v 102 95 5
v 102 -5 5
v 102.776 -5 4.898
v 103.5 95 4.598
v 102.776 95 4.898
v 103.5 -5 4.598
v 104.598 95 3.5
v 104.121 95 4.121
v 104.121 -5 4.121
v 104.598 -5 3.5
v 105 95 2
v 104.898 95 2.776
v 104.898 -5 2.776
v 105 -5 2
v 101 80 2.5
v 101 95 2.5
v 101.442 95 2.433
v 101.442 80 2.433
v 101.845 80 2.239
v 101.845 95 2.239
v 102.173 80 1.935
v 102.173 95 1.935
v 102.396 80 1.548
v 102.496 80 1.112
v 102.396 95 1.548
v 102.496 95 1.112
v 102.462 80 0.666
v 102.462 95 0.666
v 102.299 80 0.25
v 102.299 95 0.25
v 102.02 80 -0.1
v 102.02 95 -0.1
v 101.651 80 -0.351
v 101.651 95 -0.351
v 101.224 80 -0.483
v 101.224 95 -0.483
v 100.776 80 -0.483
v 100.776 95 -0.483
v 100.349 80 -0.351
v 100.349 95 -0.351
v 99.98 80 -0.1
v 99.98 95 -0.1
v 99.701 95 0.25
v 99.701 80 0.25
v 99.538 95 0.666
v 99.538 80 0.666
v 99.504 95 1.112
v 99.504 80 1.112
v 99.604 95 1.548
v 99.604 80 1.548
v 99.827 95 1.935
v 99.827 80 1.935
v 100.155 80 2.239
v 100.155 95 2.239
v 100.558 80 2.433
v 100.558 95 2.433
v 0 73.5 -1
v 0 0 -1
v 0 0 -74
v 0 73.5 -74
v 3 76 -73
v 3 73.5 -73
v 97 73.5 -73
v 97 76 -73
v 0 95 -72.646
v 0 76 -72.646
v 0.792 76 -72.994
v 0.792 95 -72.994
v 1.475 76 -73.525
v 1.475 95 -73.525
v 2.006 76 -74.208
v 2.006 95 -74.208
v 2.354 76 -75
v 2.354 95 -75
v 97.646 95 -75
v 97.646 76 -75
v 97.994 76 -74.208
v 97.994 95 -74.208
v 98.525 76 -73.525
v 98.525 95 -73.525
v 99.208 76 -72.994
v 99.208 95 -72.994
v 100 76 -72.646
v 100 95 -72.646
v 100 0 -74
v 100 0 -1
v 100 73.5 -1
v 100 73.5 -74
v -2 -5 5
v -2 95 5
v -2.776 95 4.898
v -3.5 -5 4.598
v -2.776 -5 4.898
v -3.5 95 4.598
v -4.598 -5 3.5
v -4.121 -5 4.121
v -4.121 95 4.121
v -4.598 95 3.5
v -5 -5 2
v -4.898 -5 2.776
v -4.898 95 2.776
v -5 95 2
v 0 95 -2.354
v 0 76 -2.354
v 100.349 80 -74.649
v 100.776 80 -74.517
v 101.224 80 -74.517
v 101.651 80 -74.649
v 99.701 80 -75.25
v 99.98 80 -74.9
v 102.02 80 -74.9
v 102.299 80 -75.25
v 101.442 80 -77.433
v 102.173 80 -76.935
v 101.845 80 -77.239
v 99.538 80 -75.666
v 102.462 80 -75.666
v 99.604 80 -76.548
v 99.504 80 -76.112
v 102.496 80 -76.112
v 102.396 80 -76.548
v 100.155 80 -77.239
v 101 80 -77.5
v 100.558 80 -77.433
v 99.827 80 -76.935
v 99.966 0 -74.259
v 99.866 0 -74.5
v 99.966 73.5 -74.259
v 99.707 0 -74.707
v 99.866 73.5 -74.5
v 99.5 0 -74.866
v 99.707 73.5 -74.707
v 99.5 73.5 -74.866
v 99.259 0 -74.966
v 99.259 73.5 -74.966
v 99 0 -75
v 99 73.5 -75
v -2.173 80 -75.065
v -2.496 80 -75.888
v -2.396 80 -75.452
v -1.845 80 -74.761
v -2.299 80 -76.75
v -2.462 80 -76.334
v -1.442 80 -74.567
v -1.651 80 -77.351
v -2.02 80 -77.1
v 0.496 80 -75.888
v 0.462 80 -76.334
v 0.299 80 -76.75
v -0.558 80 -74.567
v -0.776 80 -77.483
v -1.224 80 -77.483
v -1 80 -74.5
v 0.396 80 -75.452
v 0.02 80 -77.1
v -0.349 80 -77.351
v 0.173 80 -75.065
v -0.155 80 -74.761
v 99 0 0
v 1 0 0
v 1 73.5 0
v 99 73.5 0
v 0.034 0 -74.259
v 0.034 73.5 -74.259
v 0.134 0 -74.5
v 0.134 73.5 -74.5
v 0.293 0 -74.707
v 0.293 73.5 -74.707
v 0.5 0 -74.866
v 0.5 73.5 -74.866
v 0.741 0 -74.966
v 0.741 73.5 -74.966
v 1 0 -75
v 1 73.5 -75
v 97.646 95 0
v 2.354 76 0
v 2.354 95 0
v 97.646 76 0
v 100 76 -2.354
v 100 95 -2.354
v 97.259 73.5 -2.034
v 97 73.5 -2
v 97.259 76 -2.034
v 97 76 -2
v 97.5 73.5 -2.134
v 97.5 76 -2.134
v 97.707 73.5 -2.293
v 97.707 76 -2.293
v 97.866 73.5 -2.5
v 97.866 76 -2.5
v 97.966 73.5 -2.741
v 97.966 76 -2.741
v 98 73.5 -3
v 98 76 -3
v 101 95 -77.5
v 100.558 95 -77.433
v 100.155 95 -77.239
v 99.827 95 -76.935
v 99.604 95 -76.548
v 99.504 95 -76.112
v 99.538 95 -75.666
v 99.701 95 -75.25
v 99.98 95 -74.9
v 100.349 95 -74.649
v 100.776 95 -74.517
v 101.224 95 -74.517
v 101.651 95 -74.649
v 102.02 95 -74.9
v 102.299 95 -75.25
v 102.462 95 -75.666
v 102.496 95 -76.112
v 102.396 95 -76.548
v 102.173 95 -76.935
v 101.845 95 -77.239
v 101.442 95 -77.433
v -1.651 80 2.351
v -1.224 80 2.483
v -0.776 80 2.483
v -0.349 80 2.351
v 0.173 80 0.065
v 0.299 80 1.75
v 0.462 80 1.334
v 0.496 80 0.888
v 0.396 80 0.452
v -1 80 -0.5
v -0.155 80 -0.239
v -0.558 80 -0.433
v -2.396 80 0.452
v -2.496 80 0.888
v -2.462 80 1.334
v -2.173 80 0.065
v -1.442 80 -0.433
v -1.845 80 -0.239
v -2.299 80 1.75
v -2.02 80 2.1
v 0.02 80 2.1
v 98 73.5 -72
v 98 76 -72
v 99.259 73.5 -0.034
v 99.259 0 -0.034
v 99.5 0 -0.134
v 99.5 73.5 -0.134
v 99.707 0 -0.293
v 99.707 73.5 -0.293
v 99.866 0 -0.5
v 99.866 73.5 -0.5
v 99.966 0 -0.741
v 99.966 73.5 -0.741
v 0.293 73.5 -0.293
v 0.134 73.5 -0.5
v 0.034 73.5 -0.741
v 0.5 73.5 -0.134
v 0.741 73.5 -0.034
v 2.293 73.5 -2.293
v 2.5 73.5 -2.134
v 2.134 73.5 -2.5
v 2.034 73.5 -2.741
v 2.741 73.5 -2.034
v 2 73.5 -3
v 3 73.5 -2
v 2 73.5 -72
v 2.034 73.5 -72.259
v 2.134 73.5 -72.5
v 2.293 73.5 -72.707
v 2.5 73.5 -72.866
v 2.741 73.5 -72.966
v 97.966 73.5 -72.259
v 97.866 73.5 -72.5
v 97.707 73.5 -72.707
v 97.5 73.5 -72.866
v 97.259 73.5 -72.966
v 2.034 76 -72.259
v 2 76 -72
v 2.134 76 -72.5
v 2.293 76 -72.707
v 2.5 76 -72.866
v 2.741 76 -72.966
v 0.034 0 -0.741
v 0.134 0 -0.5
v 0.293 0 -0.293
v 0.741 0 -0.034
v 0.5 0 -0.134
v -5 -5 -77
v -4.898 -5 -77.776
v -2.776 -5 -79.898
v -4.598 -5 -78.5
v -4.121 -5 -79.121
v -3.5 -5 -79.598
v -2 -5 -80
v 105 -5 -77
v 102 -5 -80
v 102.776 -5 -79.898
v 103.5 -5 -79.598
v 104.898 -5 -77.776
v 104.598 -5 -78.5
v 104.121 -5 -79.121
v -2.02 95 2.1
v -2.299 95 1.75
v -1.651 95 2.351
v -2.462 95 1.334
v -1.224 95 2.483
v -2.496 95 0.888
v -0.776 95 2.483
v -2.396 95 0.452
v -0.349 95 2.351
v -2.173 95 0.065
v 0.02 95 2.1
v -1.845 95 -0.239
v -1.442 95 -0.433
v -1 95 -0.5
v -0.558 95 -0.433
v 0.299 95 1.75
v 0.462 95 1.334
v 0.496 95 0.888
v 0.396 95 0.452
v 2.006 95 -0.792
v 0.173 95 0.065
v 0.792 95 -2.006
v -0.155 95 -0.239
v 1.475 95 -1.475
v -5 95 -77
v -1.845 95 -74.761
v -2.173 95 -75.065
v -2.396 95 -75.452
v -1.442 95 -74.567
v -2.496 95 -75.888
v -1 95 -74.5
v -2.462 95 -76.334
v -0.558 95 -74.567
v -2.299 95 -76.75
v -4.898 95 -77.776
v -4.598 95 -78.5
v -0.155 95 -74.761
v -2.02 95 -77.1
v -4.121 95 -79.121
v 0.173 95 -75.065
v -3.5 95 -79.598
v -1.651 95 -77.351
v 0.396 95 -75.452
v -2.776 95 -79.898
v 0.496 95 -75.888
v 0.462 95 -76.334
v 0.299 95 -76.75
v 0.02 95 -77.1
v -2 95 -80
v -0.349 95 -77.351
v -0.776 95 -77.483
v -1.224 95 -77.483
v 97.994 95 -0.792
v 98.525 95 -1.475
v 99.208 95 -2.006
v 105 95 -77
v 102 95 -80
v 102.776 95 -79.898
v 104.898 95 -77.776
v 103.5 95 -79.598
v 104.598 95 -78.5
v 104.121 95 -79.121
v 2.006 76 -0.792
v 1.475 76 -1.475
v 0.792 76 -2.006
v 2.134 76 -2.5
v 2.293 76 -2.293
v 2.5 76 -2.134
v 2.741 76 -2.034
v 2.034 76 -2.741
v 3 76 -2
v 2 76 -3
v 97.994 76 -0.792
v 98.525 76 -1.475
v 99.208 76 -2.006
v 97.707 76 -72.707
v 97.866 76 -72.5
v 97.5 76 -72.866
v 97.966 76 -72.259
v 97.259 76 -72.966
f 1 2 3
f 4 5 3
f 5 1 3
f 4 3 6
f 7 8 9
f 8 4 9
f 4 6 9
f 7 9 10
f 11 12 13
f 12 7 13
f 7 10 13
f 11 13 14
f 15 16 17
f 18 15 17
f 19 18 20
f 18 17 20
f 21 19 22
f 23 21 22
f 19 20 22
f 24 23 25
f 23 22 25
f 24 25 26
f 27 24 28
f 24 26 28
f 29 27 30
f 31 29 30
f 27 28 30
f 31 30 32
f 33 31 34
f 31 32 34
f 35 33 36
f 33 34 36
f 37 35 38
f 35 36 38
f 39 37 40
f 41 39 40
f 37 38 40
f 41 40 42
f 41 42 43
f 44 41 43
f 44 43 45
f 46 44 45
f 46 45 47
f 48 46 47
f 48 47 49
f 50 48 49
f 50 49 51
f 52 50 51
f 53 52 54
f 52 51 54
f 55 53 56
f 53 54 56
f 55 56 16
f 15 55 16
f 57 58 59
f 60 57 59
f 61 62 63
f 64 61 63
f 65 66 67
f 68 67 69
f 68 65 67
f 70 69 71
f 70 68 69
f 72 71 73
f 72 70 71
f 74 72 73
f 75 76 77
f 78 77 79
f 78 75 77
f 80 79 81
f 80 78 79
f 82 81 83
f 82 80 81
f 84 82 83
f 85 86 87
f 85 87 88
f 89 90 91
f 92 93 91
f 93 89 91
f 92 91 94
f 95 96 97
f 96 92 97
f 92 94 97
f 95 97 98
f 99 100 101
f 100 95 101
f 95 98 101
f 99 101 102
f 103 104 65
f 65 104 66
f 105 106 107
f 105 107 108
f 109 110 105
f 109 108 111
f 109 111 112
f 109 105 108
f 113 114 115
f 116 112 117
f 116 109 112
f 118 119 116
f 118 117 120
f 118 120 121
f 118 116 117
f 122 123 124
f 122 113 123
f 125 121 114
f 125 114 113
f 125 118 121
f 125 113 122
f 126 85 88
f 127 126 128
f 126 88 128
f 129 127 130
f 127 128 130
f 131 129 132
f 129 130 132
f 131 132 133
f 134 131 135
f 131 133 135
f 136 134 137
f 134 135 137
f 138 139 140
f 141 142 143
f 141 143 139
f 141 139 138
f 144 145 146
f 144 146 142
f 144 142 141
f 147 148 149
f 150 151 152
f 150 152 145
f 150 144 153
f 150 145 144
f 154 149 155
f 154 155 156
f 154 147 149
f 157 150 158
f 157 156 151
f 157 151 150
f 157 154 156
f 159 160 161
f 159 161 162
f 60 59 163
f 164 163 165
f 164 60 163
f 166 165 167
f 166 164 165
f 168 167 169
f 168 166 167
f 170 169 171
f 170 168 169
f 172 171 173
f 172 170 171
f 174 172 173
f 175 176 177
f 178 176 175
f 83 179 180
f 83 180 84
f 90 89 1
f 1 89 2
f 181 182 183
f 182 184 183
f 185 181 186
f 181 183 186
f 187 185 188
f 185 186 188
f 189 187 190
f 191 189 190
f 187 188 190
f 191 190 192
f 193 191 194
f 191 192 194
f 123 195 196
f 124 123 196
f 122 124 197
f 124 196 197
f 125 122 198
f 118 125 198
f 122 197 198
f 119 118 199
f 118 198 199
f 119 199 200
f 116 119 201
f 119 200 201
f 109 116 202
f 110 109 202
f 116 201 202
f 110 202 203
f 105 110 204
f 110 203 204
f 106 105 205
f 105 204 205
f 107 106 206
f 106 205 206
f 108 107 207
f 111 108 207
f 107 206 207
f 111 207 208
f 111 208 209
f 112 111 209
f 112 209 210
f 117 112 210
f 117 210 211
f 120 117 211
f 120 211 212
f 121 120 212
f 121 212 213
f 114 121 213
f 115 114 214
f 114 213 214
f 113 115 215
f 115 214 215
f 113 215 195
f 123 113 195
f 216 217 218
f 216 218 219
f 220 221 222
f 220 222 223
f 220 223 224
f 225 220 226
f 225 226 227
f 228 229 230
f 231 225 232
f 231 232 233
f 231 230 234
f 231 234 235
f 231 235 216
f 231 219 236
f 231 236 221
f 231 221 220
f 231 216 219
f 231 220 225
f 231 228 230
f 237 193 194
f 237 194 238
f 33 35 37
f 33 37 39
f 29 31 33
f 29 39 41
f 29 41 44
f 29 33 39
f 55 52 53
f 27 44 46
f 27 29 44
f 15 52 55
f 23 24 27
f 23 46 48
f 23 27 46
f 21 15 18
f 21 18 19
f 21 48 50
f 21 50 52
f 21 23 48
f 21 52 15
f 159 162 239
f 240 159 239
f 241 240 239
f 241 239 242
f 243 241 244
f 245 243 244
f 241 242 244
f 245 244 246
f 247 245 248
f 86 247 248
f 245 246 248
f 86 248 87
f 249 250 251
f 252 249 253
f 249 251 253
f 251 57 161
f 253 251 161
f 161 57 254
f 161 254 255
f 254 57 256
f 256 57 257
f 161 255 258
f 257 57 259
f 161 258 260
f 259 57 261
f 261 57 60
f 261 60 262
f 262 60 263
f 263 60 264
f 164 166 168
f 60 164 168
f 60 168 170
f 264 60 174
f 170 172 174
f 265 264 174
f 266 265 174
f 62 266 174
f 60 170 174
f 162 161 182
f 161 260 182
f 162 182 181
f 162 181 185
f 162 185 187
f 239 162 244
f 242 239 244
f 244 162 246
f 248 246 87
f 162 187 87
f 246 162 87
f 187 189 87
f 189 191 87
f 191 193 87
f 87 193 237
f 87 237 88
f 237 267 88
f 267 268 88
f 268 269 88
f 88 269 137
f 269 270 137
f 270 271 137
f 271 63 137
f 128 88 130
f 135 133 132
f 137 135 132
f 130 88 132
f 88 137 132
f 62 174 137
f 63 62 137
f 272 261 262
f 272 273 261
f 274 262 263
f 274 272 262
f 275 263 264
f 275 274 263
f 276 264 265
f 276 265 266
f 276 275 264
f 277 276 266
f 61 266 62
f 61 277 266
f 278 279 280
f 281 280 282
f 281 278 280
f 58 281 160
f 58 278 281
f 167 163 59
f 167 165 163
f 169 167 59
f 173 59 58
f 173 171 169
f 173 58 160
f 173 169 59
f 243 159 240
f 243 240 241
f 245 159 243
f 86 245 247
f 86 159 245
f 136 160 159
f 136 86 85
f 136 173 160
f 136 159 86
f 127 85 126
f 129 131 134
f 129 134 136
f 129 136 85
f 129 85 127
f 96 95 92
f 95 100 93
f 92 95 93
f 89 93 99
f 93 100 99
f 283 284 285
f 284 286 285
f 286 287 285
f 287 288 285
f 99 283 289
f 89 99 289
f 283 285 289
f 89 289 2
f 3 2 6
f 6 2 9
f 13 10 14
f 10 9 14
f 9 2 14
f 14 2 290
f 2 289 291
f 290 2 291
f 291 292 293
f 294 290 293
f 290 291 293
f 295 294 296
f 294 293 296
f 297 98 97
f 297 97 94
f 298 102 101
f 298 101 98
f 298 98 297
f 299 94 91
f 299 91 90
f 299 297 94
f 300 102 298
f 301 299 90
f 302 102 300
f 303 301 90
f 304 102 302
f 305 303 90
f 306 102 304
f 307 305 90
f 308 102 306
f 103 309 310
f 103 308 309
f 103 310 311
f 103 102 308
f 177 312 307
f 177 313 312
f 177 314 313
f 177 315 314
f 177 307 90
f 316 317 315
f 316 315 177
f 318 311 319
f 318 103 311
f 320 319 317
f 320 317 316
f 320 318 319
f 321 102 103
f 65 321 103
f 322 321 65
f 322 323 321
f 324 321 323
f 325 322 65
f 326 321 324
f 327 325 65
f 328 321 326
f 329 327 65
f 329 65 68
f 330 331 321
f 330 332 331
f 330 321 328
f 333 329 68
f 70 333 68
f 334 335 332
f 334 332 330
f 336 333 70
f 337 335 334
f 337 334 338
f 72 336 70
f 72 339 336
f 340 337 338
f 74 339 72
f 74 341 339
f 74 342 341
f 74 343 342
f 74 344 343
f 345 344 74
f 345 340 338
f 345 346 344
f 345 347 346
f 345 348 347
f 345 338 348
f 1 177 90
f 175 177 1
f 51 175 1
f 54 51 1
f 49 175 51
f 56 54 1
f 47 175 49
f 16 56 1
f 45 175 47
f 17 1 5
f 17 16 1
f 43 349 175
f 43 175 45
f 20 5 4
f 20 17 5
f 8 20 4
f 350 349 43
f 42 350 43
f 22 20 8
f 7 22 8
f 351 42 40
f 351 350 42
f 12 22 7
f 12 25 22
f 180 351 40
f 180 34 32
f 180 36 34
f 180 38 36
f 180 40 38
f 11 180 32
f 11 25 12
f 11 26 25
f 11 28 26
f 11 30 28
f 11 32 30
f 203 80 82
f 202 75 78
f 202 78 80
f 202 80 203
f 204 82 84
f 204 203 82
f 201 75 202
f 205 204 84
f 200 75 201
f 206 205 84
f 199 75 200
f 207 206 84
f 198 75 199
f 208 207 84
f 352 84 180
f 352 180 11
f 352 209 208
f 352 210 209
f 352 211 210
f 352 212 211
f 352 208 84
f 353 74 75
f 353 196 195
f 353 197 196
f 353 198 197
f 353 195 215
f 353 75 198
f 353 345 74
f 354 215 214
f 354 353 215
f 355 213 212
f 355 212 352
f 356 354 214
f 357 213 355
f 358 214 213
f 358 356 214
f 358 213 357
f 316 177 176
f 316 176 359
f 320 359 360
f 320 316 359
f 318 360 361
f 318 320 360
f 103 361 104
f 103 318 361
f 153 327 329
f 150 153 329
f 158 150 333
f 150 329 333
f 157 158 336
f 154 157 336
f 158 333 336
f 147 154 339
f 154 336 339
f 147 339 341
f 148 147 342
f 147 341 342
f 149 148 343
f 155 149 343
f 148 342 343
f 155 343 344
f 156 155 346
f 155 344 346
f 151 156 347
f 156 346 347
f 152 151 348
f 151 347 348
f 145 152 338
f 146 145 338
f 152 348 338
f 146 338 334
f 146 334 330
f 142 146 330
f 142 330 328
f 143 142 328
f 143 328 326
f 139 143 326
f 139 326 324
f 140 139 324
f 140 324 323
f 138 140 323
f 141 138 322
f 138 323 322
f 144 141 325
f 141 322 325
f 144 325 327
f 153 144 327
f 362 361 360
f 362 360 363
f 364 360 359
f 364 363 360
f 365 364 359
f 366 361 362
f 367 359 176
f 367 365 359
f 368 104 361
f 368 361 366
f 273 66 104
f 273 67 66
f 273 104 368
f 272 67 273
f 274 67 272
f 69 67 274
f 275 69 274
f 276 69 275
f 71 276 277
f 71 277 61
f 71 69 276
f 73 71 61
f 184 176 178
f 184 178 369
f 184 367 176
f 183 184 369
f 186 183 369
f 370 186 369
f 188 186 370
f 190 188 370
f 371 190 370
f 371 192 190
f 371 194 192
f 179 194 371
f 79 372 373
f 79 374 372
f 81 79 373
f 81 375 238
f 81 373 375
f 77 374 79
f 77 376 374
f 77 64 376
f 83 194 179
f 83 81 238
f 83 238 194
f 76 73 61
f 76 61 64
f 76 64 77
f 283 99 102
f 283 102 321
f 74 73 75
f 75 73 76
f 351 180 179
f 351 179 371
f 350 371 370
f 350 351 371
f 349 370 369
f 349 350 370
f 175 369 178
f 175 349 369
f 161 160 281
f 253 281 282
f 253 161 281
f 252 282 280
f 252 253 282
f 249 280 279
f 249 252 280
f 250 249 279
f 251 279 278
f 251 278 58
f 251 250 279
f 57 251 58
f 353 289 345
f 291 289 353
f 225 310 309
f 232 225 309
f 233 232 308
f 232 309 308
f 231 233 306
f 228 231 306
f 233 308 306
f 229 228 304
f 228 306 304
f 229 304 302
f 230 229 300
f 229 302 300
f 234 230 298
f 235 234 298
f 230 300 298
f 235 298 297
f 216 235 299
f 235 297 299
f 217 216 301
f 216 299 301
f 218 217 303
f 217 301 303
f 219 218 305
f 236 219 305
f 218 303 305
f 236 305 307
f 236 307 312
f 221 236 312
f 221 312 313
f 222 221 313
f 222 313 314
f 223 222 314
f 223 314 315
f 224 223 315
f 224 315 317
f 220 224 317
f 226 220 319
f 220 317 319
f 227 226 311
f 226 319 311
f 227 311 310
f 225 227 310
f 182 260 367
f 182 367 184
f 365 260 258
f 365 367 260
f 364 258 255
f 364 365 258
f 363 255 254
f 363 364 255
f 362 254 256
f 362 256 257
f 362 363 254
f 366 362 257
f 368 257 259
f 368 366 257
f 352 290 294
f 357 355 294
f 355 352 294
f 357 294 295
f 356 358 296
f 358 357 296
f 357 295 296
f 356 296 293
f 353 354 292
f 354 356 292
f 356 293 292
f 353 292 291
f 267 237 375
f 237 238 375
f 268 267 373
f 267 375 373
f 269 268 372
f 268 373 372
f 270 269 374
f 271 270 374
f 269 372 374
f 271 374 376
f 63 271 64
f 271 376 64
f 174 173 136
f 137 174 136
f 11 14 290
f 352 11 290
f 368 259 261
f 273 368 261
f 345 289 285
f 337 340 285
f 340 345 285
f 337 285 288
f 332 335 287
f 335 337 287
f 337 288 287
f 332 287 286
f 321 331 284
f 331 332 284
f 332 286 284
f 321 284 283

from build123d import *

# Parameters (mm, degrees)
SKETCH1_W                = 100
SKETCH1_H                = 75
BOSS_EXTRUDE1_DEPTH      = 95
SHELL1_T                 = 5
FILLET2_R                = 3
SKETCH6_R                = 3.5
BOSS_EXTRUDE4_DEPTH      = 19
SKETCH6_4_R              = 1.5
CUT_EXTRUDE2_DEPTH       = 15
FILLET3_R                = 1
BOSS_EXTRUDE5_DEPTH      = 1
BOSS_EXTRUDE5_DEPTH_BACK = 1.5
SKETCH8_W                = 100
SKETCH8_H                = 75
SKETCH8_W_2              = 96
SKETCH8_H_2              = 71
FILLET4_R                = 1


with BuildPart() as part:
    # Sketch1 → Boss-Extrude1 (new body)
    with BuildSketch(Plane(origin=(0, 0, 0), x_dir=(1, 0, 0), z_dir=(0, 1, 0))):
        with Locations((50, 37.5)):
            Rectangle(SKETCH1_W, SKETCH1_H)
    extrude(amount=BOSS_EXTRUDE1_DEPTH)

    # Shell1
    shell1_openings = [part.faces().sort_by_distance(p)[0] for p in [
        (50, 95, -37.5),
    ]]
    offset(amount=SHELL1_T, openings=shell1_openings, kind=Kind.INTERSECTION)

    # Fillet2
    # the kernel refuses this fillet: 3 mm, written as the material it takes off along each edge
    with BuildSketch(Plane(origin=(-5, -12.5, -80), x_dir=(1, 0, 0), z_dir=(0, 1, 0)), Plane(origin=(105, -12.5, -80), x_dir=(0, 0, 1), z_dir=(0, 1, 0)), Plane(origin=(105, -12.5, 5), x_dir=(-1, 0, 0), z_dir=(0, 1, 0)), Plane(origin=(-5, 102.5, 5), x_dir=(1, 0, 0), z_dir=(0, -1, 0))) as fillet2_piece_1:
        with BuildLine():
            CenterArc((FILLET2_R, -FILLET2_R), FILLET2_R, 90, 90)
            Line((0, -FILLET2_R), (0, 0))
            Line((0, 0), (FILLET2_R, 0))
        make_face()
    extrude(amount=115, mode=Mode.SUBTRACT)

    # Sketch6 → Boss-Extrude4 (add)
    with BuildSketch(Plane(origin=(0, 95, 0), x_dir=(1, 0, 0), z_dir=(0, 1, 0))):
        with Locations((-1, 76)):
            Circle(SKETCH6_R)
        with Locations((101, 76)):
            Circle(SKETCH6_R)
        with Locations((101, -1)):
            Circle(SKETCH6_R)
        with Locations((-1, -1)):
            Circle(SKETCH6_R)
    extrude(amount=-BOSS_EXTRUDE4_DEPTH)

    # Sketch6<4> → Cut-Extrude2 (cut)
    with BuildSketch(Plane(origin=(0, 95, 0), x_dir=(1, 0, 0), z_dir=(0, 1, 0))):
        with Locations(Location((-1, 76, 0), (0, 0, 270))):
            Circle(SKETCH6_4_R)
        with Locations(Location((101, 76, 0), (0, 0, 90))):
            Circle(SKETCH6_4_R)
        with Locations(Location((101, -1, 0), (0, 0, 270))):
            Circle(SKETCH6_4_R)
        with Locations(Location((-1, -1, 0), (0, 0, 90))):
            Circle(SKETCH6_4_R)
    extrude(amount=-CUT_EXTRUDE2_DEPTH, mode=Mode.SUBTRACT)

    # Fillet3
    fillet3_edges = [part.edges().sort_by_distance(p)[0] for p in [
        (0, 38, 0),
        (0, 38, -75),
        (100, 38, -75),
        (100, 38, 0),
    ]]
    fillet(fillet3_edges, radius=FILLET3_R)

    # Sketch8 → Boss-Extrude5 (add, two sides: drawn at the far end of the back side and taken through both)
    with BuildSketch(Plane(origin=(0, 75, 0), x_dir=(1, 0, 0), z_dir=(0, 1, 0)).offset(-BOSS_EXTRUDE5_DEPTH_BACK)):
        with Locations((50, 37.5)):
            Rectangle(SKETCH8_W, SKETCH8_H)
        with Locations((50, 37.5)):
            Rectangle(SKETCH8_W_2, SKETCH8_H_2, mode=Mode.SUBTRACT)
    extrude(amount=BOSS_EXTRUDE5_DEPTH + BOSS_EXTRUDE5_DEPTH_BACK)

    # Fillet4
    fillet4_edges = [part.edges().sort_by_distance(p)[0] for p in [
        (2, 74.75, -73),
        (98, 74.75, -73),
        (98, 74.75, -2),
        (2, 74.75, -2),
    ]]
    fillet(fillet4_edges, radius=FILLET4_R)


solid = part.part
